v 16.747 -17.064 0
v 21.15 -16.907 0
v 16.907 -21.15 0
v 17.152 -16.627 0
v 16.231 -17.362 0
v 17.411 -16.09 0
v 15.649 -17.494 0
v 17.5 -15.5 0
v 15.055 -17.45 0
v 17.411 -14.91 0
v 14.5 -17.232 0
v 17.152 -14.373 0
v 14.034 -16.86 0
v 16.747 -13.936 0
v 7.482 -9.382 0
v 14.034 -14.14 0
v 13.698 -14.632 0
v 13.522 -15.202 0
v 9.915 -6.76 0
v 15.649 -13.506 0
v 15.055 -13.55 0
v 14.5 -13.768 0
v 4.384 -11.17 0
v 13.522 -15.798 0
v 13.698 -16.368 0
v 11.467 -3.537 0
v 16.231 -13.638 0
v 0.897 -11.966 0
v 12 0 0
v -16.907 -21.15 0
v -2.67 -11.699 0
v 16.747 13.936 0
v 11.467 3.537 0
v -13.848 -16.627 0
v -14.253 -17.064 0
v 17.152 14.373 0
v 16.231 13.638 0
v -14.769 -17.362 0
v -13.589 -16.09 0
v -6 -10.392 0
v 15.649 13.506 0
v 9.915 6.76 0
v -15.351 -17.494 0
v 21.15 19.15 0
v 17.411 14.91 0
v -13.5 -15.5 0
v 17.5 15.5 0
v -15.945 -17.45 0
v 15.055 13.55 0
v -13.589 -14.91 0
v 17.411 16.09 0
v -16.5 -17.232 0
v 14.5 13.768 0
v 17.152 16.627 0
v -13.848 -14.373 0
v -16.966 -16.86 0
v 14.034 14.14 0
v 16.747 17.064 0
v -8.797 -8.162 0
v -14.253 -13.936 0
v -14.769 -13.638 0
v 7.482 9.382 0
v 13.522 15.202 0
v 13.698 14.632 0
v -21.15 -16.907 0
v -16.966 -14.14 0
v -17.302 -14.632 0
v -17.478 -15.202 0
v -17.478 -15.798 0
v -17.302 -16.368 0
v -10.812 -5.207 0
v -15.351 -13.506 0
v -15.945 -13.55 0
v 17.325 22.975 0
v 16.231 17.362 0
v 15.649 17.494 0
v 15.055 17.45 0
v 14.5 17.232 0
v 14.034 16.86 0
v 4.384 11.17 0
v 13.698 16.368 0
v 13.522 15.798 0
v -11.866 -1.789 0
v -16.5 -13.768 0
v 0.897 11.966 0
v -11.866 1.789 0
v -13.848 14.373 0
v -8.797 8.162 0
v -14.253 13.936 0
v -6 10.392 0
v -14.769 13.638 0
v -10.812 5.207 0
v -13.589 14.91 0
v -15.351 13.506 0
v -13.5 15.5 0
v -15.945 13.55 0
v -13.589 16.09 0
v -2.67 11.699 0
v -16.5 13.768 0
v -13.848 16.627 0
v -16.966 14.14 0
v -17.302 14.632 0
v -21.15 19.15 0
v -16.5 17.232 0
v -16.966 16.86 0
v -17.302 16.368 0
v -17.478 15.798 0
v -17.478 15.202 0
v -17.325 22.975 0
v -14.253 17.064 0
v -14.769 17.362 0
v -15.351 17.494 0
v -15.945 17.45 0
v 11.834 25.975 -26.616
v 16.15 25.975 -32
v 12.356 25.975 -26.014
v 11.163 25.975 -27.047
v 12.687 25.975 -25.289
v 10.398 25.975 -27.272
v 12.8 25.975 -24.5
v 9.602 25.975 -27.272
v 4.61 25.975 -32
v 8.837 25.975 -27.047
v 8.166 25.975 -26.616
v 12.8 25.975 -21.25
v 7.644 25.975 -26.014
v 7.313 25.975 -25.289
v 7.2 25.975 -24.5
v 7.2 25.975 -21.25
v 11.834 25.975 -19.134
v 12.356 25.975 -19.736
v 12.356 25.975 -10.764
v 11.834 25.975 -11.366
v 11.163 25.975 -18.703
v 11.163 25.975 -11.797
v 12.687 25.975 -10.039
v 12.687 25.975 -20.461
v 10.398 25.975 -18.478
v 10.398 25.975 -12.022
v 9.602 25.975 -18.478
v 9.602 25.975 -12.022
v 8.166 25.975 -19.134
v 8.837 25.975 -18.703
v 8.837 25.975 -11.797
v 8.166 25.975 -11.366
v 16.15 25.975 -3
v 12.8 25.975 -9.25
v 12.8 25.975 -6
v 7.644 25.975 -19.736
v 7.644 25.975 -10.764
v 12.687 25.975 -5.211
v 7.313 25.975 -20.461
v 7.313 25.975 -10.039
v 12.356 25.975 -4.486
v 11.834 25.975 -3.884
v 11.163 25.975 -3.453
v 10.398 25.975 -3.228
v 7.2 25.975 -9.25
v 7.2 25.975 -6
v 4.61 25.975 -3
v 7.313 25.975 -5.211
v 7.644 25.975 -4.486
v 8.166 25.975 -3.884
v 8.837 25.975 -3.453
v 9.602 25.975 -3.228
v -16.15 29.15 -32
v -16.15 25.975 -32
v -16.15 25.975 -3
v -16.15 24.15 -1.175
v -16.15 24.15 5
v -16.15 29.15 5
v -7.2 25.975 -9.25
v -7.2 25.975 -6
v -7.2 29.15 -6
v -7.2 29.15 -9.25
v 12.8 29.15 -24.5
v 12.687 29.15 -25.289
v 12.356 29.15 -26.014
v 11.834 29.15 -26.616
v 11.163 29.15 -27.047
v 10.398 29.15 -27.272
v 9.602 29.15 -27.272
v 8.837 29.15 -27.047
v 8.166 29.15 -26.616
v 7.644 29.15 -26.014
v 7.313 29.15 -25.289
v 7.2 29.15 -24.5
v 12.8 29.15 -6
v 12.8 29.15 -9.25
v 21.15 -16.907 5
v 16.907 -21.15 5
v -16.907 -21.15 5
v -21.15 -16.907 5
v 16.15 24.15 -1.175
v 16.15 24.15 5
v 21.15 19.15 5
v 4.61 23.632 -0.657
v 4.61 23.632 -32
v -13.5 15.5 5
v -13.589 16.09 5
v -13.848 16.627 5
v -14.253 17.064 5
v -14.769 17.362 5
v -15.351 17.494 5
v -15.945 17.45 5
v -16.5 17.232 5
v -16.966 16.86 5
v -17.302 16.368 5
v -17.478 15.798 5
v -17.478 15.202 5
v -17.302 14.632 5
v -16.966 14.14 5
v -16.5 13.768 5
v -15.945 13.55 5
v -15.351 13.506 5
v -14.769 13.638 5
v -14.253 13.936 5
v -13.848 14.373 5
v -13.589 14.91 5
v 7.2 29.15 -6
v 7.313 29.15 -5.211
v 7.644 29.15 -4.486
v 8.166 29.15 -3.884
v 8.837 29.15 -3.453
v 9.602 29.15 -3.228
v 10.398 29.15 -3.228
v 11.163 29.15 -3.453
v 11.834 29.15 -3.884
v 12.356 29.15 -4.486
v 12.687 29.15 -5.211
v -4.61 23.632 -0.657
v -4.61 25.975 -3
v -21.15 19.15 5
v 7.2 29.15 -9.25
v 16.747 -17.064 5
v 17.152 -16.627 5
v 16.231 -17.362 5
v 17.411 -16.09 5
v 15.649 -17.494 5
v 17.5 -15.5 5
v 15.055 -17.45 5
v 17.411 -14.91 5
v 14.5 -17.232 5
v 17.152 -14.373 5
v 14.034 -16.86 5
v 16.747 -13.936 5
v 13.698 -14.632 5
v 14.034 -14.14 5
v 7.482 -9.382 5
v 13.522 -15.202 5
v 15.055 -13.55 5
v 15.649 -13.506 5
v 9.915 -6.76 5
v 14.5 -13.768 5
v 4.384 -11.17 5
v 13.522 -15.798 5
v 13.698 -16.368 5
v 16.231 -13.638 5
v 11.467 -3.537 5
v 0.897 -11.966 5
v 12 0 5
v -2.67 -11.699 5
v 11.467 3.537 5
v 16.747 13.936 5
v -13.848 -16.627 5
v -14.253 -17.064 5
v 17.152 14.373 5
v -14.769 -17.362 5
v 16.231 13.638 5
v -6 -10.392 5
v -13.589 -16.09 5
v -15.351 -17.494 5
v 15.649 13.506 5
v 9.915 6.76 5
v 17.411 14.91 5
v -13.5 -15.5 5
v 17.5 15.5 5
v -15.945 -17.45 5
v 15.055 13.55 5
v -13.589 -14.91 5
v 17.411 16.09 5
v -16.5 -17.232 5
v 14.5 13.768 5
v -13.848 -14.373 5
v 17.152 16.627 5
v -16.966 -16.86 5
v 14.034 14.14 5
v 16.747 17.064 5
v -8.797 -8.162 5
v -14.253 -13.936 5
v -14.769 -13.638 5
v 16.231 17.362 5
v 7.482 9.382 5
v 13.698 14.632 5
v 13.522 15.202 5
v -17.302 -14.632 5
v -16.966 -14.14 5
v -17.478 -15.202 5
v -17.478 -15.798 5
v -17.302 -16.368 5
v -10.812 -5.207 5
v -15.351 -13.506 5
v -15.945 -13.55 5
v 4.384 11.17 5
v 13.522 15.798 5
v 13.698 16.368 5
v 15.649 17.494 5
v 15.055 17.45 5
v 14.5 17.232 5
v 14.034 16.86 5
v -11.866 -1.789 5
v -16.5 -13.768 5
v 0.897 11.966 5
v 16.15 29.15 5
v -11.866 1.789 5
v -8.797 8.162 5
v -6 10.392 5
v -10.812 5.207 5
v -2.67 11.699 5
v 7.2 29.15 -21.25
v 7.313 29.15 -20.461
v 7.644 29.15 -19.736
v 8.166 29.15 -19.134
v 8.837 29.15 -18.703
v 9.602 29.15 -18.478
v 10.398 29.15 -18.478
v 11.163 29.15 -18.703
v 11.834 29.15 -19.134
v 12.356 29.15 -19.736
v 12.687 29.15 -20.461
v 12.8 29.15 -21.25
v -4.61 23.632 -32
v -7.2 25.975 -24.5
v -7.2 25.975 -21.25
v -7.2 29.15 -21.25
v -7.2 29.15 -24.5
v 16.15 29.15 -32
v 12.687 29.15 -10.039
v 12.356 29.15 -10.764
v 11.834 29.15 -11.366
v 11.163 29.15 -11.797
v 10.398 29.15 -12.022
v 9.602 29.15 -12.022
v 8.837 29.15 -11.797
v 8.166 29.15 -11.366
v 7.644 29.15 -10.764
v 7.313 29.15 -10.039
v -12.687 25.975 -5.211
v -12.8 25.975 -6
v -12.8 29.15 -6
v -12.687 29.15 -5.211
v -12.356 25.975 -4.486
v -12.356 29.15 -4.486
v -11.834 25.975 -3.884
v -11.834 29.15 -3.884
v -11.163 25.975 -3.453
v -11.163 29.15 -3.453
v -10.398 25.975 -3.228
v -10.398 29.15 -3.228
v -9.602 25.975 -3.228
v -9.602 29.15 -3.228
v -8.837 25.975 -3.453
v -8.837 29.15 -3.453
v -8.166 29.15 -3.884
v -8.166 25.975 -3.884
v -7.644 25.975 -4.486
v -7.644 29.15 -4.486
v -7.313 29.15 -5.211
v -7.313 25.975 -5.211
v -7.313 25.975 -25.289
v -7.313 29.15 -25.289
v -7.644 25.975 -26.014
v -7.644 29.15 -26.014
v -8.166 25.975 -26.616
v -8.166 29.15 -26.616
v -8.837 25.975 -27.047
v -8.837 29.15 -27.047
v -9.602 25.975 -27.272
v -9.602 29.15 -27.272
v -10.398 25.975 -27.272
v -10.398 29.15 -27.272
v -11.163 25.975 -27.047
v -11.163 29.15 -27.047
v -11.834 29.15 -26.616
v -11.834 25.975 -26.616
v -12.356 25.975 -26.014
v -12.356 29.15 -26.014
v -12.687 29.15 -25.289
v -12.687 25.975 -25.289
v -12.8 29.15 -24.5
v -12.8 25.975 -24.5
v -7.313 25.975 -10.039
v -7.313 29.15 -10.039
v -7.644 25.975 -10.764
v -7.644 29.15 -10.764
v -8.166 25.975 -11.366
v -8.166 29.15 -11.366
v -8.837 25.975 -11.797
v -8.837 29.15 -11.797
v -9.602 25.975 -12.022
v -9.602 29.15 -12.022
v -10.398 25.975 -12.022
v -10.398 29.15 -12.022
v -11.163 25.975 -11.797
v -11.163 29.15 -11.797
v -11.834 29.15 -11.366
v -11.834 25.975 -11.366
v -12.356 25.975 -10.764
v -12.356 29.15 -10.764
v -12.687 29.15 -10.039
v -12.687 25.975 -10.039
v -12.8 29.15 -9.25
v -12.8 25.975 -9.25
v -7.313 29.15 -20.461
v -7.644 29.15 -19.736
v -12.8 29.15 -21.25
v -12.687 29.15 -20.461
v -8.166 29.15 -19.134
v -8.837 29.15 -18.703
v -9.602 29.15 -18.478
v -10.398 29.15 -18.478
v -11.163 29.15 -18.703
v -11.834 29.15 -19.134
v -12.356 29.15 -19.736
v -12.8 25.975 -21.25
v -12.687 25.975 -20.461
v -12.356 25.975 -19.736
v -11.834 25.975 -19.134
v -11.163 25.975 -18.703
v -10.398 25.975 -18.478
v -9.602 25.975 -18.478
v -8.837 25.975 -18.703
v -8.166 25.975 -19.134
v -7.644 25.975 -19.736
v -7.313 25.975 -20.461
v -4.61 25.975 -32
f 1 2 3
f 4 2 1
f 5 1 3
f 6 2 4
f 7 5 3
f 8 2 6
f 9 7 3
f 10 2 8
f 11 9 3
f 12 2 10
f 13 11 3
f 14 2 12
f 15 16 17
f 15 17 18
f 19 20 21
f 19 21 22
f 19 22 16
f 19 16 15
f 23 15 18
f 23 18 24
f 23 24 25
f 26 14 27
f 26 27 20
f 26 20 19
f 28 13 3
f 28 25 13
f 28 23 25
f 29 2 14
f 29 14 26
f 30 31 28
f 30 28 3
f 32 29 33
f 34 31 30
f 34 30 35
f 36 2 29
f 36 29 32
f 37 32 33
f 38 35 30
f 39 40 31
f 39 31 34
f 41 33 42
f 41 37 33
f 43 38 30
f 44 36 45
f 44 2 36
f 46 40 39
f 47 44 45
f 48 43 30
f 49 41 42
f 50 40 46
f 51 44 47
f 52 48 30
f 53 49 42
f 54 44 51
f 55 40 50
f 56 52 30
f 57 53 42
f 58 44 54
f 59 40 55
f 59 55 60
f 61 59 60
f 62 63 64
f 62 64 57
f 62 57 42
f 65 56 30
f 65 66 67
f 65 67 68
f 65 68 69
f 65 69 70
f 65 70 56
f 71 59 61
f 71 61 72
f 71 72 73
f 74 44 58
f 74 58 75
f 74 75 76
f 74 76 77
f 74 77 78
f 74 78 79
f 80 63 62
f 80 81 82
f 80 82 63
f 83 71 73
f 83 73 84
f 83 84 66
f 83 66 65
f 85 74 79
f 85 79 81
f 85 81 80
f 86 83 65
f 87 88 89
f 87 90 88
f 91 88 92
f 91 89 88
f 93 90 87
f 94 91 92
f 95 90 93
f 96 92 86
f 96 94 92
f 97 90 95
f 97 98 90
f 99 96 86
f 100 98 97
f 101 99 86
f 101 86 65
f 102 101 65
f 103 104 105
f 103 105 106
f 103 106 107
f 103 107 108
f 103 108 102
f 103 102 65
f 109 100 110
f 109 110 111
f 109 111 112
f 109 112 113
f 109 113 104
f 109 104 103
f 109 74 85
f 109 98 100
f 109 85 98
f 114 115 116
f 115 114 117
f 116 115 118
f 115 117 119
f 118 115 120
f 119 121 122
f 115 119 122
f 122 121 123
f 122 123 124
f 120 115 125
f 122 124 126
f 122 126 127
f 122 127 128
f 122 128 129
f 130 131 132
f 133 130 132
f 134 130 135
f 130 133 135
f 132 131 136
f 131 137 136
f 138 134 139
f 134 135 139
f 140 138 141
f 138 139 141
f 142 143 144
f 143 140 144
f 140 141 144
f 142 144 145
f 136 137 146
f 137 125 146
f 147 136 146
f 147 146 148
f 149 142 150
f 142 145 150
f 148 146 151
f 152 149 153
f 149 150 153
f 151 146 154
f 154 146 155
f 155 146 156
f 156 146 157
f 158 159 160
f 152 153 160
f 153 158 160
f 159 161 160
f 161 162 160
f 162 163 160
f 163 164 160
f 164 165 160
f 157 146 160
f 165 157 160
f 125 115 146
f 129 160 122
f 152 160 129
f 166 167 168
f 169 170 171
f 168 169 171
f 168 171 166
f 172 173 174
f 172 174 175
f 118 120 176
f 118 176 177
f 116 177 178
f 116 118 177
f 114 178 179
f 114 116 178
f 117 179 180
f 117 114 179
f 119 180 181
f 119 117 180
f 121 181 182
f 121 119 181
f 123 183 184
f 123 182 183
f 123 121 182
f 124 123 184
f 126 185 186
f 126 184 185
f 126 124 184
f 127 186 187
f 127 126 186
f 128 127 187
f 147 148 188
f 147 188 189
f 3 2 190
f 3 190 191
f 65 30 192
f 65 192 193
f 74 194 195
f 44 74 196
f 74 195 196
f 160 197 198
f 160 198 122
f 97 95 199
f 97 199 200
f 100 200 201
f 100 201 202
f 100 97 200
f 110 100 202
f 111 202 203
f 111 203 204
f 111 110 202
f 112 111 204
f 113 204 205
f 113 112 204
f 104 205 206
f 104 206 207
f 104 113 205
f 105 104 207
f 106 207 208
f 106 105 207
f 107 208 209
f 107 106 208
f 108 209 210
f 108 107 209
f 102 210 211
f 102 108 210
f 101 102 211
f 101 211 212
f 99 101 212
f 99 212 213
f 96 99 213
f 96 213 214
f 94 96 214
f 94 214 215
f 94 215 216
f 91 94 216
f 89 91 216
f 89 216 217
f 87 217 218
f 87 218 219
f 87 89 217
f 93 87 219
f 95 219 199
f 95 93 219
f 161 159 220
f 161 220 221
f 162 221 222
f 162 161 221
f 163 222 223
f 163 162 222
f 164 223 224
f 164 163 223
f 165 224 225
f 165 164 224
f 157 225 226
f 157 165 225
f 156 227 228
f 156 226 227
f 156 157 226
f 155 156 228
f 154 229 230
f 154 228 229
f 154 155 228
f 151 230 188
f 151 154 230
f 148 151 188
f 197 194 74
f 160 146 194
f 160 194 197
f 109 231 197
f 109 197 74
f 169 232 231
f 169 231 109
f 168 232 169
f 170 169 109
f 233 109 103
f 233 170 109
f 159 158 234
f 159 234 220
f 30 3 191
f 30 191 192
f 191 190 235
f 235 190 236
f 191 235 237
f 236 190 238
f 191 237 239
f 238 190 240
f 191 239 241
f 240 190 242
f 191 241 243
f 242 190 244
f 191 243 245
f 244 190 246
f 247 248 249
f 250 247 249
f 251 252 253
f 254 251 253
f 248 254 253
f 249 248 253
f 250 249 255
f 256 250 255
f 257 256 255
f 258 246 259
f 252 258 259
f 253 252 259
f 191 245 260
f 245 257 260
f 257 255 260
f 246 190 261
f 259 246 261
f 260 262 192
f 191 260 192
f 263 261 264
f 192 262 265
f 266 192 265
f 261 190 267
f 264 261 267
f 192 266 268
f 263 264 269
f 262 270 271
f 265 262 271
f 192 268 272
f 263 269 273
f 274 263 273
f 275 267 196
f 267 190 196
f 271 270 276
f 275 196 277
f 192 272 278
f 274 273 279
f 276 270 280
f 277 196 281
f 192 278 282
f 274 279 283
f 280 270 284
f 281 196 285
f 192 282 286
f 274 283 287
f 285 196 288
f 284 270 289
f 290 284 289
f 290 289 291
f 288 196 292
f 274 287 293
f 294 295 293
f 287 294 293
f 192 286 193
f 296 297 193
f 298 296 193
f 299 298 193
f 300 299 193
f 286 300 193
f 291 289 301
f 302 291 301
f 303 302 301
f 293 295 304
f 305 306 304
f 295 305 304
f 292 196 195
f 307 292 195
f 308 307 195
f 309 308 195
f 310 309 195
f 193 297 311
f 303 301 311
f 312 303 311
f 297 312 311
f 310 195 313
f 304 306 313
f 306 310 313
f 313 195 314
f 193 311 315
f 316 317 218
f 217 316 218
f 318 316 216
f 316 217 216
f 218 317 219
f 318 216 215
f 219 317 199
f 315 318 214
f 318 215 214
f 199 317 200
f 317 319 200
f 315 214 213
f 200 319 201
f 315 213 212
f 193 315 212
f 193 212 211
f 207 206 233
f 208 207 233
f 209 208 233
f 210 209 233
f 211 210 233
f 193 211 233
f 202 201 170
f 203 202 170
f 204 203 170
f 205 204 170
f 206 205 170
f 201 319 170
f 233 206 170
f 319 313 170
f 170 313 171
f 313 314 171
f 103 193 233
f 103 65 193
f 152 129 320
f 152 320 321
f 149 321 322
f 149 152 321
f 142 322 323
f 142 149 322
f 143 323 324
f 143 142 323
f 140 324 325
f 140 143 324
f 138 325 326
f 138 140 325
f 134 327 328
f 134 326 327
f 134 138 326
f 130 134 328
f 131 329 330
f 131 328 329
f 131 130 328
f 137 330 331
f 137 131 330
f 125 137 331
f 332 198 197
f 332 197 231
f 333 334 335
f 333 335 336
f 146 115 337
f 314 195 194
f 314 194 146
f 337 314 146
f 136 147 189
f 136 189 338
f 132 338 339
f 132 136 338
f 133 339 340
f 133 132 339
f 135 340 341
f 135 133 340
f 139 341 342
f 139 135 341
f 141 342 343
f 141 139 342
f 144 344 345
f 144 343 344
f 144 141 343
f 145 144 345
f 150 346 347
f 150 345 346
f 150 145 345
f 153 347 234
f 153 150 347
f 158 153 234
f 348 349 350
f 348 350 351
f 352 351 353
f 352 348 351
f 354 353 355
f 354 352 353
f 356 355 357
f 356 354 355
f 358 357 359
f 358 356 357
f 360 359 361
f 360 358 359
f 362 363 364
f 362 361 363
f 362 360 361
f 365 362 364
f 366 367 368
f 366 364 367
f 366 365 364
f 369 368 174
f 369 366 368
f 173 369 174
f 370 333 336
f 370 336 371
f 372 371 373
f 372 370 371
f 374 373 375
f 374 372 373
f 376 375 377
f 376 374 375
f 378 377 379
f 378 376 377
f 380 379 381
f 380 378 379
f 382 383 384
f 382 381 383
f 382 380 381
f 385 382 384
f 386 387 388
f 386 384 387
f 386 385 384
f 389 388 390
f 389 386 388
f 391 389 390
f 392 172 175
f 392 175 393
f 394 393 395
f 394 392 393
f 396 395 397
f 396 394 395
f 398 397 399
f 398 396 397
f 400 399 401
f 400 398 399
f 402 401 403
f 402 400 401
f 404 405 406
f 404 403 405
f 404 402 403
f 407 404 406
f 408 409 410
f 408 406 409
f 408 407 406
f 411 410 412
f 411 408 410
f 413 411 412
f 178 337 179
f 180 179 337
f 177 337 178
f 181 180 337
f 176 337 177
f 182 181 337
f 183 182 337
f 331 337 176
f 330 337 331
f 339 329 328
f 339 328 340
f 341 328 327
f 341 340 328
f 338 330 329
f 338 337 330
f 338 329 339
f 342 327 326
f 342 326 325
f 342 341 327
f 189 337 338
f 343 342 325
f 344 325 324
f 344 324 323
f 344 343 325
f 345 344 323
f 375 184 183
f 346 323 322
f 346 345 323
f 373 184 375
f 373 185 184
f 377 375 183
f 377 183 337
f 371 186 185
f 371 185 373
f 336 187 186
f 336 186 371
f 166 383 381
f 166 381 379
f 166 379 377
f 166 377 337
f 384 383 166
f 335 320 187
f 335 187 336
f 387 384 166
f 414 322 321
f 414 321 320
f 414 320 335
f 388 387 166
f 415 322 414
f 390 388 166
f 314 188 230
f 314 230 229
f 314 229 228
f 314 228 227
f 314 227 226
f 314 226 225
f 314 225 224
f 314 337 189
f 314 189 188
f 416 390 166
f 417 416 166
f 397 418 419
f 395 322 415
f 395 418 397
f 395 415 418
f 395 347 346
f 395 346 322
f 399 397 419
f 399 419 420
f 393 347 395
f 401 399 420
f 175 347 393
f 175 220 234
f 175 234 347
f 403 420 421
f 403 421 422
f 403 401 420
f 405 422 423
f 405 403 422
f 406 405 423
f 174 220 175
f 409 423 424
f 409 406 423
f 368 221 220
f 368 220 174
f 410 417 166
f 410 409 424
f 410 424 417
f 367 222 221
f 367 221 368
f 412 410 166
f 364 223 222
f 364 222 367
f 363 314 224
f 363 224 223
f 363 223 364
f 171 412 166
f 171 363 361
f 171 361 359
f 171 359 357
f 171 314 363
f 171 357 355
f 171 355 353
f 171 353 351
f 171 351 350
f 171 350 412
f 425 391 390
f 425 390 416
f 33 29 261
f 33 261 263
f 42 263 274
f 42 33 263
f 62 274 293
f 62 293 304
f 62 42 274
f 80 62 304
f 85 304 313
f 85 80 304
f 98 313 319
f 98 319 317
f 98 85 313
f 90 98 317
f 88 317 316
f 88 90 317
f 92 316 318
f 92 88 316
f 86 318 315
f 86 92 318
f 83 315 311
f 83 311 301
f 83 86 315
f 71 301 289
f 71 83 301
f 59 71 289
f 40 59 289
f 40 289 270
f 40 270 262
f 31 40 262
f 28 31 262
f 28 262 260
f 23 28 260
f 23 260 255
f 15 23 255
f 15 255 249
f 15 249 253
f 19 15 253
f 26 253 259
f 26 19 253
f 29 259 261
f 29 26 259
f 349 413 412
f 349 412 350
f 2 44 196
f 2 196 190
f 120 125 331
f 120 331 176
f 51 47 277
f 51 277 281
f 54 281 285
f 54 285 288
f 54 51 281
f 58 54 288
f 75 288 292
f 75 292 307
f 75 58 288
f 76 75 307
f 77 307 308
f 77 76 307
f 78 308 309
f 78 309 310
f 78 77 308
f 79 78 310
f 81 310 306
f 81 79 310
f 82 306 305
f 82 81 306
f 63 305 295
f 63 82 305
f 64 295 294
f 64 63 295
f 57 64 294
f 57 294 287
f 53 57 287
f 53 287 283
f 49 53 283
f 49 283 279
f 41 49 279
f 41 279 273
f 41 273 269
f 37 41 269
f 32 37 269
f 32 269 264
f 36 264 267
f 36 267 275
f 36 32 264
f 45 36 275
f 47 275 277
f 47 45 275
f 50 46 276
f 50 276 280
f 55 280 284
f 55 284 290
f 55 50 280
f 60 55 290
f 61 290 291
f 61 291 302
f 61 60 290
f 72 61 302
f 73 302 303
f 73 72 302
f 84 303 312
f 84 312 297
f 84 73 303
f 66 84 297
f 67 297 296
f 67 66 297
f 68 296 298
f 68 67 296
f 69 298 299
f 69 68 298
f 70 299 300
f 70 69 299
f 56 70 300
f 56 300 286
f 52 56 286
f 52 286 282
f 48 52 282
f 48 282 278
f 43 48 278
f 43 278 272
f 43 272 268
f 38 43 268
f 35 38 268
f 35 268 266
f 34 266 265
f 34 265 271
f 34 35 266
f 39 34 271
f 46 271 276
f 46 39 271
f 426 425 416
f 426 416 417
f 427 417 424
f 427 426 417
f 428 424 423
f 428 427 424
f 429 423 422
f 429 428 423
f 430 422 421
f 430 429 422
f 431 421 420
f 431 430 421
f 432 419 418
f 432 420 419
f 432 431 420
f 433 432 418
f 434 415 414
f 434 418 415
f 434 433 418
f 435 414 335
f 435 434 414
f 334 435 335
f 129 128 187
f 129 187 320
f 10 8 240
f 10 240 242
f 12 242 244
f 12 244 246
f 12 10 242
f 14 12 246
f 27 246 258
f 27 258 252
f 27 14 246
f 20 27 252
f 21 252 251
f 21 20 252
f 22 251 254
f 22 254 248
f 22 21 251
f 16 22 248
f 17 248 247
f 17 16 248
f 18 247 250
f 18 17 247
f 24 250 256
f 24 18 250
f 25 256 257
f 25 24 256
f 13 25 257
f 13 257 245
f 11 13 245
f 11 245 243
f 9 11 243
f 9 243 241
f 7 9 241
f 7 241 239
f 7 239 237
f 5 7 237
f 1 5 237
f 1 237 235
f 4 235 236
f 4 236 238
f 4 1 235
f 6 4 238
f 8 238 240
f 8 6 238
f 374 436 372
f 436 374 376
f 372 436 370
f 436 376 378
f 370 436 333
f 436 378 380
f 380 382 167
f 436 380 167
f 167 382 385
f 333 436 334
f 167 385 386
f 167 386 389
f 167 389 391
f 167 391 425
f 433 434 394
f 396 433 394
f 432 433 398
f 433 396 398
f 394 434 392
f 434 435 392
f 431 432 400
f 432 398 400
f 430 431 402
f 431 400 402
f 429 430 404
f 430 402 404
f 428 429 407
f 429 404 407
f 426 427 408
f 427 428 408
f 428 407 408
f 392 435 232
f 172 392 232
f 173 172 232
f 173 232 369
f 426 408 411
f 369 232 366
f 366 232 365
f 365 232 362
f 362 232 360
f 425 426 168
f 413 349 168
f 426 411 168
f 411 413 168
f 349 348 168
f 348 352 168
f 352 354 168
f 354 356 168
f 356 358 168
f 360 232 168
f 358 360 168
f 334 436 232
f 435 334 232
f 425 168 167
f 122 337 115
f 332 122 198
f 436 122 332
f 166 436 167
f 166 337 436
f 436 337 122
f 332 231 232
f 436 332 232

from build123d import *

# Parameters (mm, degrees)
SKETCH1_R           = 2
SKETCH1_R_2         = 12
BOSS_EXTRUDE1_DEPTH = 5
SKETCH2_W           = 32.3
SKETCH2_H           = 3.175
BOSS_EXTRUDE2_DEPTH = 32
CHAMFER1_SIZE       = 3
CUT_EXTRUDE1_DEPTH  = 10
CUT_EXTRUDE2_DEPTH  = 10
BOSS_EXTRUDE3_REACH = 53.634
SKETCH5_W           = 9.21920545
SKETCH5_H           = 4.68574677


with BuildPart() as part:
    # Sketch1 → Boss-Extrude1 (new body)
    with BuildSketch(Plane.XY):
        Polygon((-21.15, -16.907359313), (-21.15, 24.149999999), (-16.15, 24.149999999), (-16.15, 29.149999999), (16.15, 29.149999999), (16.15, 24.149999999), (21.15, 24.149999999), (21.15, -16.907359313), (16.907359313, -21.15), (-16.907359313, -21.15), align=None)
        with Locations((-15.5, 15.5)):
            Circle(SKETCH1_R, mode=Mode.SUBTRACT)
        with Locations((-15.5, -15.5)):
            Circle(SKETCH1_R, mode=Mode.SUBTRACT)
        Circle(SKETCH1_R_2, mode=Mode.SUBTRACT)
        with Locations((15.5, -15.5)):
            Circle(SKETCH1_R, mode=Mode.SUBTRACT)
        with Locations((15.5, 15.5)):
            Circle(SKETCH1_R, mode=Mode.SUBTRACT)
    extrude(amount=BOSS_EXTRUDE1_DEPTH)

    # Sketch2 → Boss-Extrude2 (add)
    with BuildSketch(Plane(origin=(0, 0, 0), x_dir=(-1, 0, 0), z_dir=(0, 0, -1))):
        with Locations((0, 27.562499999)):
            Rectangle(SKETCH2_W, SKETCH2_H)
    extrude(amount=BOSS_EXTRUDE2_DEPTH)

    # Chamfer1
    chamfer1_edges = [part.edges().sort_by_distance(p)[0] for p in [
        (0, 25.974999999, 0),
    ]]
    chamfer(chamfer1_edges, length=CHAMFER1_SIZE)

    # Sketch3 → Cut-Extrude1 (cut)
    with BuildSketch(Plane.XZ.offset(-25.974999999)):
        with BuildLine():
            Line((7.2, -9.25), (7.2, -6))
            ThreePointArc((7.2, -6), (10, -3.2), (12.8, -6))
            Line((12.8, -6), (12.8, -9.25))
            ThreePointArc((12.8, -9.25), (10, -12.05), (7.2, -9.25))
        make_face()
        with BuildLine():
            Line((-12.799999999, -9.25), (-12.799999999, -6))
            ThreePointArc((-12.799999999, -6), (-9.999999999, -3.2), (-7.199999999, -6))
            Line((-7.199999999, -6), (-7.199999999, -9.25))
            ThreePointArc((-7.199999999, -9.25), (-9.999999999, -12.05), (-12.799999999, -9.25))
        make_face()
        with BuildLine():
            Line((12.8, -21.25), (12.8, -24.5))
            ThreePointArc((12.8, -24.5), (10, -27.3), (7.2, -24.5))
            Line((7.2, -24.5), (7.2, -21.25))
            ThreePointArc((7.2, -21.25), (10, -18.45), (12.8, -21.25))
        make_face()
        with BuildLine():
            Line((-7.199999999, -21.25), (-7.199999999, -24.5))
            ThreePointArc((-7.199999999, -24.5), (-9.999999999, -27.3), (-12.799999999, -24.5))
            Line((-12.799999999, -24.5), (-12.799999999, -21.25))
            ThreePointArc((-12.799999999, -21.25), (-9.999999999, -18.45), (-7.199999999, -21.25))
        make_face()
    extrude(amount=-CUT_EXTRUDE1_DEPTH, mode=Mode.SUBTRACT)

    # Sketch4 → Cut-Extrude2 (cut)
    with BuildSketch(Plane.XY.offset(5)):
        Polygon((16.15, 24.149999999), (21.15, 19.149999999), (21.15, 24.149999999), align=None)
        Polygon((-21.15, 24.149999999), (-16.15, 24.149999999), (-21.15, 19.149999999), align=None)
    extrude(amount=-CUT_EXTRUDE2_DEPTH, mode=Mode.SUBTRACT)

    # Boss-Extrude3: up to this plane
    boss_extrude3_end = Plane(origin=(-16.15, 25.974999999, -3), z_dir=(0, -0.7071067811865506, -0.7071067811865445))
    # Sketch5 → Boss-Extrude3 (add, up to the surface)
    with BuildSketch(Plane(origin=(0, 0, -32), x_dir=(-1, 0, 0), z_dir=(0, 0, -1)), mode=Mode.PRIVATE) as boss_extrude3_sk1:
        with Locations((0, 25.974999999)):
            Rectangle(SKETCH5_W, SKETCH5_H)
    boss_extrude3_tool1 = split(extrude(boss_extrude3_sk1.sketch, amount=-BOSS_EXTRUDE3_REACH, mode=Mode.PRIVATE), bisect_by=boss_extrude3_end, keep=Keep.BOTH, mode=Mode.PRIVATE)
    add(boss_extrude3_tool1.solids().sort_by_distance((0, 25.975, -32))[0])


solid = part.part
